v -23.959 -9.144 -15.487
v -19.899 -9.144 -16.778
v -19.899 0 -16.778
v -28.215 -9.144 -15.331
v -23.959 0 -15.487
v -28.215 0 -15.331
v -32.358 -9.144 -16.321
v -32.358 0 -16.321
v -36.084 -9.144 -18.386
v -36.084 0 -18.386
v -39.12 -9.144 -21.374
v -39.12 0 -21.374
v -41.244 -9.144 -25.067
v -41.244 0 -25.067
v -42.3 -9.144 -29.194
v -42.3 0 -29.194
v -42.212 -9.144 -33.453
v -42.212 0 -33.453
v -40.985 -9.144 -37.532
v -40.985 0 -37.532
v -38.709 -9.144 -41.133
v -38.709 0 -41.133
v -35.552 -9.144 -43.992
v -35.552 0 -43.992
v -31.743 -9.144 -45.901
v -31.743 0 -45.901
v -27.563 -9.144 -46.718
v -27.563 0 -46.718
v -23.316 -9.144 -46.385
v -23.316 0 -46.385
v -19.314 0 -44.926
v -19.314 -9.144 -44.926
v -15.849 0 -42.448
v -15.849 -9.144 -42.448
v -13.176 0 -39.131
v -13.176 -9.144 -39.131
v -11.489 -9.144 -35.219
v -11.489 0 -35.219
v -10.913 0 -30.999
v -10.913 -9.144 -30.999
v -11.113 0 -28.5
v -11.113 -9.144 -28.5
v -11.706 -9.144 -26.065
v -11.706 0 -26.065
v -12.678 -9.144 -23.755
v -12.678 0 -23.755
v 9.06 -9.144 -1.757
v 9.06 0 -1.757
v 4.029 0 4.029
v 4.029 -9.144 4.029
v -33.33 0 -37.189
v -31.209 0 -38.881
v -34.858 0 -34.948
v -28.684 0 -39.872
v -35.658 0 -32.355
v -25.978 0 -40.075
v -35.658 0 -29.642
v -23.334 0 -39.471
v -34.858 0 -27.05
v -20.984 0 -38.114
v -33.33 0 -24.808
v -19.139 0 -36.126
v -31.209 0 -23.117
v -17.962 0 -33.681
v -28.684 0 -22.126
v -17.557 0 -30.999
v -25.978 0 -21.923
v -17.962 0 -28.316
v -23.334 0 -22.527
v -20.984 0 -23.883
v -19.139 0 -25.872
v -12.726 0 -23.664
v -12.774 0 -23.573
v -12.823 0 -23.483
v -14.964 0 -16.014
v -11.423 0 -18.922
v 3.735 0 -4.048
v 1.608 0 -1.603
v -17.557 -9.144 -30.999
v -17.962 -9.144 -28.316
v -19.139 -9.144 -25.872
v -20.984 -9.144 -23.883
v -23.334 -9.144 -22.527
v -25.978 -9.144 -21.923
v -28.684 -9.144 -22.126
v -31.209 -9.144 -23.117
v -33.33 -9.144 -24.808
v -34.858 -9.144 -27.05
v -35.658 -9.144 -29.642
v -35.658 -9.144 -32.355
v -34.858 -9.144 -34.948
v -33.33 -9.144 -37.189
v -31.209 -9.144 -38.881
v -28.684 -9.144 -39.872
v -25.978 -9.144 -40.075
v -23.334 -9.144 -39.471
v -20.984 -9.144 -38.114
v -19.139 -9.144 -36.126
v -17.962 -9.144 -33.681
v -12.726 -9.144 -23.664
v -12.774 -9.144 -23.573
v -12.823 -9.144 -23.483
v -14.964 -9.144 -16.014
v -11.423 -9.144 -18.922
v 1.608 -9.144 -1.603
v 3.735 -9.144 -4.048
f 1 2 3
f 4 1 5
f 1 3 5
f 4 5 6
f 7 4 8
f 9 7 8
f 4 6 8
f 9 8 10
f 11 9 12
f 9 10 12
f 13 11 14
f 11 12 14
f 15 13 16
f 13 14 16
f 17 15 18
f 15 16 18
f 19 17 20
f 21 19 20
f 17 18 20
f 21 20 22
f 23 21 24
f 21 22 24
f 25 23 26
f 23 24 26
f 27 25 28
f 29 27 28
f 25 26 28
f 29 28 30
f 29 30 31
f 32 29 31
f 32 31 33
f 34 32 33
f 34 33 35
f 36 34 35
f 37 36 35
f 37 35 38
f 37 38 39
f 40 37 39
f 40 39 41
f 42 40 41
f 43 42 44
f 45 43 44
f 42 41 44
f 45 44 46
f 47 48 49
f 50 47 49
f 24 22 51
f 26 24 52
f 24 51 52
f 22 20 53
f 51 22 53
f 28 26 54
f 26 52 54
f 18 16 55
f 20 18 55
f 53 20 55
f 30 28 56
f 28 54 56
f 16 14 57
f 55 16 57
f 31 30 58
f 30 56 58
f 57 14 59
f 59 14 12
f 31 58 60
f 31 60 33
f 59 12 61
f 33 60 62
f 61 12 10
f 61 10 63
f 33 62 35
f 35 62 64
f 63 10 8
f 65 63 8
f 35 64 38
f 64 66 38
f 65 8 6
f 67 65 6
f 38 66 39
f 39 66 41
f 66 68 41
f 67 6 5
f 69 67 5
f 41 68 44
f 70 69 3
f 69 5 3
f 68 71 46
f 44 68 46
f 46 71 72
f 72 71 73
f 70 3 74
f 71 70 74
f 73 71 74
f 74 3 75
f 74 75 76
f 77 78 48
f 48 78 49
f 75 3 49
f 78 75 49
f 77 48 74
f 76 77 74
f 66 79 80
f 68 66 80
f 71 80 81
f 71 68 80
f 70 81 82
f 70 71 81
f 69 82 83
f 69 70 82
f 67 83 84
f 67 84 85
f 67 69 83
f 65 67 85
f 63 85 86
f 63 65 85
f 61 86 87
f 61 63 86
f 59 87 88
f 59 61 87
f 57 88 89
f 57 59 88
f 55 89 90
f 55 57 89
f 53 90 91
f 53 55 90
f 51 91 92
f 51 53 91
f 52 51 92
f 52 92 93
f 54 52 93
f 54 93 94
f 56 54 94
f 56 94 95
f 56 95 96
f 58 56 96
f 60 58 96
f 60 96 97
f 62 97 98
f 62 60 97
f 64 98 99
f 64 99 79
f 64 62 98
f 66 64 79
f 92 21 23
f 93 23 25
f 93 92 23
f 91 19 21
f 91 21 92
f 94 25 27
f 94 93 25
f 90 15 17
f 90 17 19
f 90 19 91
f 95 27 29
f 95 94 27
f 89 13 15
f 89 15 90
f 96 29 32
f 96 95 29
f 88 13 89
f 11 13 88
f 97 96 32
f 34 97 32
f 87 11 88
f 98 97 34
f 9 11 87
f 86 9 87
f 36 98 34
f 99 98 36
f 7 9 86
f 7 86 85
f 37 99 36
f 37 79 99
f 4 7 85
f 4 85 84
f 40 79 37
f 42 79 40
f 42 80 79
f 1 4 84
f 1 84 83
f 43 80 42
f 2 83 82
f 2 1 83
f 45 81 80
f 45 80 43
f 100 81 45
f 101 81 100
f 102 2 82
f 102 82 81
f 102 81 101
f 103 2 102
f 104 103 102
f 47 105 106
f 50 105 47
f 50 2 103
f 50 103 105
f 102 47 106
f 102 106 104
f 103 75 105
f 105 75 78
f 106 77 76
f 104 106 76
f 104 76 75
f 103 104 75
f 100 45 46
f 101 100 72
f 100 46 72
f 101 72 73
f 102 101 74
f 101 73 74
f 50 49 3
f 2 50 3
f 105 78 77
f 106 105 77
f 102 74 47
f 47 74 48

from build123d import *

# Parameters (mm, degrees)
F0_R     = 9.101215
F1_DEPTH = 9.144
F3_DEPTH = 9.144


with BuildPart() as f1:
    # F0 (on Front) → F1 (new body)
    with BuildSketch(Plane.XZ):
        with BuildLine():
            ThreePointArc((-19.067402, -17.204188), (-40.212946, -39.010997), (-10.913195, -30.998787))
            ThreePointArc((-10.913195, -30.998787), (-11.36082, -27.271094), (-12.678245, -23.755351))
            ThreePointArc((-12.678245, -23.755351), (-15.386403, -20.005377), (-19.067402, -17.204188))
        make_face()
        with Locations((-26.658566, -30.998787)):
            Circle(F0_R, mode=Mode.SUBTRACT)
    extrude(amount=F1_DEPTH)

    # F2 (on Front) → F3 (join)
    with BuildSketch(Plane.XZ):
        Polygon((4.029281, 4.029281), (-22.448849, -18.995181), (-14.390289, -25.039099), (9.060461, -1.756575), align=None)
        Polygon((-11.423091, -18.922271), (-14.96415, -16.013544), (1.608393, -1.602637), (3.734771, -4.047971), align=None, mode=Mode.SUBTRACT)
    extrude(amount=F3_DEPTH)


solid = f1.part
